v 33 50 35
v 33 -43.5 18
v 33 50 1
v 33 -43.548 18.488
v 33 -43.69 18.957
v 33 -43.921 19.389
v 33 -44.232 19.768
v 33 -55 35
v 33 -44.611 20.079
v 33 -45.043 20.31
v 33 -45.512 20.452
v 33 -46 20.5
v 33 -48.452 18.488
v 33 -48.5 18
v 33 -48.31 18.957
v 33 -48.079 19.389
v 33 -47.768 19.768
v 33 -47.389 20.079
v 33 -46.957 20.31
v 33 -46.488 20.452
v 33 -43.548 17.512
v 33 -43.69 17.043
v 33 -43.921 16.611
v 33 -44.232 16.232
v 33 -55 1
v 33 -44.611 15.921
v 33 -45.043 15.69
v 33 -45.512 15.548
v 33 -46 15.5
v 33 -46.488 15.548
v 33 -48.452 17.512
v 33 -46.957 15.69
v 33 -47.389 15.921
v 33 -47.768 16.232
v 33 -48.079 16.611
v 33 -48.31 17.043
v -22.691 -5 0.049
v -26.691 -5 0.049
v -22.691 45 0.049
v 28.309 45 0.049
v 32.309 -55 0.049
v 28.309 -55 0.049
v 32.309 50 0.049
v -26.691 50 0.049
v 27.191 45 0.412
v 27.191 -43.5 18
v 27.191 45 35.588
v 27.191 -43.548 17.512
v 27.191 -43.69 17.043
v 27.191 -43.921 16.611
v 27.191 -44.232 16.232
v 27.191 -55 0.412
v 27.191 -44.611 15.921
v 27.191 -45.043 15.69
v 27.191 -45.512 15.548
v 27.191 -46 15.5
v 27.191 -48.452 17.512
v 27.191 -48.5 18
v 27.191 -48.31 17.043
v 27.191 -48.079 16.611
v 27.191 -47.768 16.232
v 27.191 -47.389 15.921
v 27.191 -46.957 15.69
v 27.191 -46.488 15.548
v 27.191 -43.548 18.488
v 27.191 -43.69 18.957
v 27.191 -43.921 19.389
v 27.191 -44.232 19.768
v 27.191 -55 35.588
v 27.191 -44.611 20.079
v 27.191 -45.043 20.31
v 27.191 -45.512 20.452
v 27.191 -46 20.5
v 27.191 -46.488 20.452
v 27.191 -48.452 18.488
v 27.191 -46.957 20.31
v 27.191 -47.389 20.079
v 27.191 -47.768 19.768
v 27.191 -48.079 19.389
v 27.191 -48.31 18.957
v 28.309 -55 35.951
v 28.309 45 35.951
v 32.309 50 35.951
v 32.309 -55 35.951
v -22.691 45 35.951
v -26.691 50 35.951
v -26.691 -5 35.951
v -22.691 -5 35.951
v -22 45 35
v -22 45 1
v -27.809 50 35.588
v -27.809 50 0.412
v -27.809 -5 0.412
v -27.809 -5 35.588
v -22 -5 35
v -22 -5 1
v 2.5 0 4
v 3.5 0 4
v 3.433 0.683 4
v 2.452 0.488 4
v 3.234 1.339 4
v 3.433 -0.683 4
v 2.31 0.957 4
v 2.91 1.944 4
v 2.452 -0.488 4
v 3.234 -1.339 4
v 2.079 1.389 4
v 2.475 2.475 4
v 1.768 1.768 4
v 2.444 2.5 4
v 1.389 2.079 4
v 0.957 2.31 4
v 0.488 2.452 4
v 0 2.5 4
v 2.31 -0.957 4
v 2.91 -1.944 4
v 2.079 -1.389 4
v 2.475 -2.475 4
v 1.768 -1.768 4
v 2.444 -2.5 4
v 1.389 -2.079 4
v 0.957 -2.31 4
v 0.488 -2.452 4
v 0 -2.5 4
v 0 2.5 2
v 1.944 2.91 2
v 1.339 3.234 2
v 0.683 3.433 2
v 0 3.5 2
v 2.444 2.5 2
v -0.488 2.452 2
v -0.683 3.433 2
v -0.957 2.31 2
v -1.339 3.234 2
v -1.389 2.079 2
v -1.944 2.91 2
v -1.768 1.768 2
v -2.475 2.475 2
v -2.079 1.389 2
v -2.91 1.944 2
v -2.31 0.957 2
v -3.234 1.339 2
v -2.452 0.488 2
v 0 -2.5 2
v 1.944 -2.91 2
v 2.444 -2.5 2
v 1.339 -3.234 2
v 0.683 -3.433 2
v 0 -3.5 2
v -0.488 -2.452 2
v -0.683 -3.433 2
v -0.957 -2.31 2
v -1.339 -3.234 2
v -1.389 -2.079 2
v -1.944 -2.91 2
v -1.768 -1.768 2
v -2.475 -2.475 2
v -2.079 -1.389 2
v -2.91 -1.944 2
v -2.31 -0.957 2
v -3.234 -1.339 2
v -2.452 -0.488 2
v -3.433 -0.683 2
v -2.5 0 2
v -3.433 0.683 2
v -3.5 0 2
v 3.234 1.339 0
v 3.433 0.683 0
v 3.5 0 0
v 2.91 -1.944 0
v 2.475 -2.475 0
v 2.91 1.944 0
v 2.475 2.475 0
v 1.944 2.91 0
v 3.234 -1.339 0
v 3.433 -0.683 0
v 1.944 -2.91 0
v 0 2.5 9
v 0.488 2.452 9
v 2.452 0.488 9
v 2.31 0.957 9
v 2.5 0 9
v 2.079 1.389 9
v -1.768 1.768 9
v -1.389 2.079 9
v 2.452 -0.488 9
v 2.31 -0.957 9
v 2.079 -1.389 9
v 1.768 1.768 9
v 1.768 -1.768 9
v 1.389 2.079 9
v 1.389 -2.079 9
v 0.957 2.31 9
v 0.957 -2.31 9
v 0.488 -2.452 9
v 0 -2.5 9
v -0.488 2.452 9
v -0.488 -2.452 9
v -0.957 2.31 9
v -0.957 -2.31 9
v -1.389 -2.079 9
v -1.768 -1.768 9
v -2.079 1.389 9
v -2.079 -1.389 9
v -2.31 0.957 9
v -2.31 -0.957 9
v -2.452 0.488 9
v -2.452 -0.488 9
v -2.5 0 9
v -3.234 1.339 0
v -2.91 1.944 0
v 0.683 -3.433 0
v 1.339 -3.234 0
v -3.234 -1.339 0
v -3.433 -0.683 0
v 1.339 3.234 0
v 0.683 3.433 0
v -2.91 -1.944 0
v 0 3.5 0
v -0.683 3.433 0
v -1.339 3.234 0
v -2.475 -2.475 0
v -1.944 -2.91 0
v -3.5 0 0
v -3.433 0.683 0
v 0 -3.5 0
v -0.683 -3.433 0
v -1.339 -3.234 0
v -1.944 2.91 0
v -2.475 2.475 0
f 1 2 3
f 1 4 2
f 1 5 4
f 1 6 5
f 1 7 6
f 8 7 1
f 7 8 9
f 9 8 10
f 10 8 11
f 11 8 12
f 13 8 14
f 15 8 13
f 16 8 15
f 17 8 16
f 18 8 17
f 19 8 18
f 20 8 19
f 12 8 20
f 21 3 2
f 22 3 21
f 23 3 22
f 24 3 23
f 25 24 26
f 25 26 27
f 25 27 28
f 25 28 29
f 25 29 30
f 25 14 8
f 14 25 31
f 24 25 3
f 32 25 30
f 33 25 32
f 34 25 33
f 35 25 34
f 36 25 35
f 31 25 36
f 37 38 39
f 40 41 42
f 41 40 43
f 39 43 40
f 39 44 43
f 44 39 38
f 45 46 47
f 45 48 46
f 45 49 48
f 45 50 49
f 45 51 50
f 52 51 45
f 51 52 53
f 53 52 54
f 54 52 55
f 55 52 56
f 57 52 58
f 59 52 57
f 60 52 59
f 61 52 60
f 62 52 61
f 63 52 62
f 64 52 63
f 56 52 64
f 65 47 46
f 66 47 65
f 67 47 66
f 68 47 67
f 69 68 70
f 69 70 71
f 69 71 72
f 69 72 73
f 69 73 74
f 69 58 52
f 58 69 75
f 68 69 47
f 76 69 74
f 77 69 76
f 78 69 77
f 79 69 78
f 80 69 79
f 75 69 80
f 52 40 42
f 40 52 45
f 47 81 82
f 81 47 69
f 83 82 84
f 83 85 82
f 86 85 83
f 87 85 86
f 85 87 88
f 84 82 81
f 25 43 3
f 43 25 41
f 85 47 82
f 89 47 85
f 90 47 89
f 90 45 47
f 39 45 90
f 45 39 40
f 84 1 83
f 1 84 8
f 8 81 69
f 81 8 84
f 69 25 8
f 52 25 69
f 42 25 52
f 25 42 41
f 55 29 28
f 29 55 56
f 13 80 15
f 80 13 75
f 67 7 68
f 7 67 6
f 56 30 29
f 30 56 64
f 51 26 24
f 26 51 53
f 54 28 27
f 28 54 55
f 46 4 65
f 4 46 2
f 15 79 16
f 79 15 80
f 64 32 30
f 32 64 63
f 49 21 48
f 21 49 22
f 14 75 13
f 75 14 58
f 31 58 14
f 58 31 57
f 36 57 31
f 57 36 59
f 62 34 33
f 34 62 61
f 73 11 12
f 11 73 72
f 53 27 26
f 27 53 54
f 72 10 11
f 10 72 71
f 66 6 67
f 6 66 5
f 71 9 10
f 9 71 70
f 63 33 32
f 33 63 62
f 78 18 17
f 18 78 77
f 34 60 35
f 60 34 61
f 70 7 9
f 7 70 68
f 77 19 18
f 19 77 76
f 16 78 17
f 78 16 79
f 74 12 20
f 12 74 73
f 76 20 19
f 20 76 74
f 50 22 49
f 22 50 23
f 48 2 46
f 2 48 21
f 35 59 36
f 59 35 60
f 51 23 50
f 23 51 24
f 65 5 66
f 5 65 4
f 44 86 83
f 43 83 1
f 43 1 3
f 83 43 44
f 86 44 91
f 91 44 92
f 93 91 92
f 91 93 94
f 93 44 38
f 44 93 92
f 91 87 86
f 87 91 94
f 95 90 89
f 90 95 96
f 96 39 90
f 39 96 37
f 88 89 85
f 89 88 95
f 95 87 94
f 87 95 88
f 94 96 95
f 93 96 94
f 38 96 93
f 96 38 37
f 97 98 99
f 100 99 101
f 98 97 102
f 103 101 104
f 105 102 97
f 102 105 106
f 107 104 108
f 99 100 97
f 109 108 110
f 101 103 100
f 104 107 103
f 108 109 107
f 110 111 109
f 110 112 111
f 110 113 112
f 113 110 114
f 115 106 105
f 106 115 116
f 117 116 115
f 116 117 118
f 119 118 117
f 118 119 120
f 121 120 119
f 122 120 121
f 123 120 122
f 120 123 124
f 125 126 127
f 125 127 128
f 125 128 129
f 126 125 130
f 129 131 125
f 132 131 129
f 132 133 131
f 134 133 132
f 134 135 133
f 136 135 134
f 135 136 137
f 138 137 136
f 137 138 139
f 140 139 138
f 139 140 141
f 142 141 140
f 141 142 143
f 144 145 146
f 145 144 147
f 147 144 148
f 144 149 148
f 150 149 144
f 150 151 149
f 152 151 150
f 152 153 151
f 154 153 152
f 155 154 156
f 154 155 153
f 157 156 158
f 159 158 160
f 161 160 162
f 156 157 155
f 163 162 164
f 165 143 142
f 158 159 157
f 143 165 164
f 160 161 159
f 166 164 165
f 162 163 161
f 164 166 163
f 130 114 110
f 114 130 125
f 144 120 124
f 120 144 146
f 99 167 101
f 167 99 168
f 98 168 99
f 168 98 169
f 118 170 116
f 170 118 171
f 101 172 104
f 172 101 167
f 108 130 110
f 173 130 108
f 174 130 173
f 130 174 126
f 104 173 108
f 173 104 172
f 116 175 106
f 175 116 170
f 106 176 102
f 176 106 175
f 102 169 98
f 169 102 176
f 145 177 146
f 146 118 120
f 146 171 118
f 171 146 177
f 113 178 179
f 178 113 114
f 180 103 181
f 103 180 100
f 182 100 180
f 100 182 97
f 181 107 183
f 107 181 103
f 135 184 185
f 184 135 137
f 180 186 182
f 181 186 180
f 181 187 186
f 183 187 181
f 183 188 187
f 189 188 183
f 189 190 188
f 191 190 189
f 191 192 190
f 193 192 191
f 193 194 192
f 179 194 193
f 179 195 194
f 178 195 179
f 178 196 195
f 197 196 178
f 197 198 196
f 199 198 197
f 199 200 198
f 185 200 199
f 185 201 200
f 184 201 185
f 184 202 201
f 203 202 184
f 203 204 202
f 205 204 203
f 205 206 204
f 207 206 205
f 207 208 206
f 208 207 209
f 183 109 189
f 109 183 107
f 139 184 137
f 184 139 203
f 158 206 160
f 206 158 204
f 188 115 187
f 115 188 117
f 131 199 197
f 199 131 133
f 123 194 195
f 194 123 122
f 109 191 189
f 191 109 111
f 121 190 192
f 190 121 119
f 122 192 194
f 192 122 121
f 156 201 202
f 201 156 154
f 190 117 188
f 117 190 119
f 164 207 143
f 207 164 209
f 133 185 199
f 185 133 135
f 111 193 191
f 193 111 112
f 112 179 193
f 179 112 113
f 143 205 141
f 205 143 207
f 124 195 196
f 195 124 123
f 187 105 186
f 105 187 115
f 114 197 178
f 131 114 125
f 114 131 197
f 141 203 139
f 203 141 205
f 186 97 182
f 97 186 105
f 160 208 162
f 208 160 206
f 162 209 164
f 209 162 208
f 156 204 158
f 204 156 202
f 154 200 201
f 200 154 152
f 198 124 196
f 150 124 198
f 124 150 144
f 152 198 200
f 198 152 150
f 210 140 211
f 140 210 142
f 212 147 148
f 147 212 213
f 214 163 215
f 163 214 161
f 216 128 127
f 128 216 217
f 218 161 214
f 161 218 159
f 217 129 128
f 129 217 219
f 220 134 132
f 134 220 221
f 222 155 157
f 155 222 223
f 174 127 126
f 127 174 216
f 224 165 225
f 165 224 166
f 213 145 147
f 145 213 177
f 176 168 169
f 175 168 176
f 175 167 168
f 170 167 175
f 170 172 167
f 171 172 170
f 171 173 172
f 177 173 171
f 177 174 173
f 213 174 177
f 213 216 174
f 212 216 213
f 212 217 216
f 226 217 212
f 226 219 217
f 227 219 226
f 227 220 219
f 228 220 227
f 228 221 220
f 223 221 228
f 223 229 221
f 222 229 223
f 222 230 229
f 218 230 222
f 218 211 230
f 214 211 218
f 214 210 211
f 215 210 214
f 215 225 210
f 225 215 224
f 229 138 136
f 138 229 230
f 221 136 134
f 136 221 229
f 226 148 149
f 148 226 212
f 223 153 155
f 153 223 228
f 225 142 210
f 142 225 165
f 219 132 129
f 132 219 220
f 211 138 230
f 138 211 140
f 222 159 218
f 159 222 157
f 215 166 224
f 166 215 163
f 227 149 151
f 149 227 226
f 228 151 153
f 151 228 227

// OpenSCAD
// preview[view:south west, tilt:top diagonal]

/* [General Settings] */
// How thick is the cubical wall?
wall_thickness = 50;//[15:75]

// How long should the back side be?
back_height = 50;//[15:100]

// How long should the front side be?
front_height = 100;//[30:150]

// Adjust the resolution
resolution = 32;//[16:36]
$cf=resolution;

// How wide should the hanger be?
hanger_width = 35;//[5:75]

// How thick should the plastic be?
hanger_thickness = 5;//[2:10]

/* [Hook Settings] */
// Diameter of the hook (this should be smaller than the hole for clearance).
hook_diameter = 7;//[1:25]

// Thickness of the hook (shallower than hole depth for clearance).
hook_depth = 2;//[1:10]

// Diameter of the bar (this should be smaller than the smallest part of the hole for clearance).
bar_diameter = 5;//[1:20]

// Length of the hook bar (slightly larger than keyhole material thickness).
bar_depth = 2;//[1:10]

/* [Hidden] */

edge_radius = 1;

main(); //runs program

module main(){

	translate( [-wall_thickness / 2, front_height / 2, hanger_width / 2 + edge_radius / 2] ) rotate( a=[ 90, 0, 0] ) {
		//Top
		translate( [( wall_thickness + hanger_thickness ) / 2, 0, 0] ) {
			roundedRect( size = [( wall_thickness + 2 * hanger_thickness ), hanger_width, hanger_thickness], radius = edge_radius );
		}

		//Back
		translate( [0, 0, hanger_thickness] ) {
			roundedRect( size = [hanger_thickness, hanger_width, back_height], radius = edge_radius );
		}

		//Front
		difference() {
			translate( [( wall_thickness + hanger_thickness ), 0, hanger_thickness] ) roundedRect( size = [hanger_thickness, hanger_width, front_height], radius = edge_radius );
			translate( [( wall_thickness + 1.5 * hanger_thickness + hook_depth + bar_depth ), 0, ( front_height - ( hook_diameter / 2 ) + hook_depth - 0.5 * hanger_thickness )] ) rotate(a=[0, 270, 0]) cylinder( h = bar_depth + 2 * hanger_thickness, r = ( bar_diameter / 2 ), $fn = $cf );
		}
	}

	//Hooks
	drawHook();
}

module drawHook() {

	large_radius = ( hook_diameter / 2 );
	small_radius = ( bar_diameter / 2 );

	cylinder( h = hook_depth, r1 = large_radius, r2 = large_radius, $fn = $cf );

	translate( [ 0, 0, hook_depth ] ) {

		cylinder( h = bar_depth + hanger_thickness, r1 = small_radius, r2 = small_radius, $fn = $cf );

		intersection() {

			translate( [0, -small_radius, 0] ) {
				cube( [hook_diameter, bar_diameter, bar_depth] );
			}

			cylinder( h = bar_depth, r1 = large_radius, r2 = large_radius, $fn = $cf );
		}
	}
}

module roundedRect( size, radius ) {

	x = size[0];
	y = size[1];
	z = size[2];

	linear_extrude( height = z )

	hull() {

		// place 4 circles in the corners, with the given radius
		translate( [( -x / 2 ) + ( radius / 2 ), ( -y / 2 ) + ( radius / 2 ), 0] ) circle( r = radius );

		translate( [( x / 2 ) - ( radius / 2 ), ( -y / 2 ) + ( radius / 2 ), 0] ) circle( r = radius );

		translate( [( -x / 2 ) + ( radius / 2 ), ( y / 2 ) - ( radius / 2 ), 0] ) circle( r = radius );

		translate( [( x / 2 ) - ( radius / 2 ), ( y / 2 ) - ( radius / 2 ), 0] ) circle( r = radius );
	}
}
